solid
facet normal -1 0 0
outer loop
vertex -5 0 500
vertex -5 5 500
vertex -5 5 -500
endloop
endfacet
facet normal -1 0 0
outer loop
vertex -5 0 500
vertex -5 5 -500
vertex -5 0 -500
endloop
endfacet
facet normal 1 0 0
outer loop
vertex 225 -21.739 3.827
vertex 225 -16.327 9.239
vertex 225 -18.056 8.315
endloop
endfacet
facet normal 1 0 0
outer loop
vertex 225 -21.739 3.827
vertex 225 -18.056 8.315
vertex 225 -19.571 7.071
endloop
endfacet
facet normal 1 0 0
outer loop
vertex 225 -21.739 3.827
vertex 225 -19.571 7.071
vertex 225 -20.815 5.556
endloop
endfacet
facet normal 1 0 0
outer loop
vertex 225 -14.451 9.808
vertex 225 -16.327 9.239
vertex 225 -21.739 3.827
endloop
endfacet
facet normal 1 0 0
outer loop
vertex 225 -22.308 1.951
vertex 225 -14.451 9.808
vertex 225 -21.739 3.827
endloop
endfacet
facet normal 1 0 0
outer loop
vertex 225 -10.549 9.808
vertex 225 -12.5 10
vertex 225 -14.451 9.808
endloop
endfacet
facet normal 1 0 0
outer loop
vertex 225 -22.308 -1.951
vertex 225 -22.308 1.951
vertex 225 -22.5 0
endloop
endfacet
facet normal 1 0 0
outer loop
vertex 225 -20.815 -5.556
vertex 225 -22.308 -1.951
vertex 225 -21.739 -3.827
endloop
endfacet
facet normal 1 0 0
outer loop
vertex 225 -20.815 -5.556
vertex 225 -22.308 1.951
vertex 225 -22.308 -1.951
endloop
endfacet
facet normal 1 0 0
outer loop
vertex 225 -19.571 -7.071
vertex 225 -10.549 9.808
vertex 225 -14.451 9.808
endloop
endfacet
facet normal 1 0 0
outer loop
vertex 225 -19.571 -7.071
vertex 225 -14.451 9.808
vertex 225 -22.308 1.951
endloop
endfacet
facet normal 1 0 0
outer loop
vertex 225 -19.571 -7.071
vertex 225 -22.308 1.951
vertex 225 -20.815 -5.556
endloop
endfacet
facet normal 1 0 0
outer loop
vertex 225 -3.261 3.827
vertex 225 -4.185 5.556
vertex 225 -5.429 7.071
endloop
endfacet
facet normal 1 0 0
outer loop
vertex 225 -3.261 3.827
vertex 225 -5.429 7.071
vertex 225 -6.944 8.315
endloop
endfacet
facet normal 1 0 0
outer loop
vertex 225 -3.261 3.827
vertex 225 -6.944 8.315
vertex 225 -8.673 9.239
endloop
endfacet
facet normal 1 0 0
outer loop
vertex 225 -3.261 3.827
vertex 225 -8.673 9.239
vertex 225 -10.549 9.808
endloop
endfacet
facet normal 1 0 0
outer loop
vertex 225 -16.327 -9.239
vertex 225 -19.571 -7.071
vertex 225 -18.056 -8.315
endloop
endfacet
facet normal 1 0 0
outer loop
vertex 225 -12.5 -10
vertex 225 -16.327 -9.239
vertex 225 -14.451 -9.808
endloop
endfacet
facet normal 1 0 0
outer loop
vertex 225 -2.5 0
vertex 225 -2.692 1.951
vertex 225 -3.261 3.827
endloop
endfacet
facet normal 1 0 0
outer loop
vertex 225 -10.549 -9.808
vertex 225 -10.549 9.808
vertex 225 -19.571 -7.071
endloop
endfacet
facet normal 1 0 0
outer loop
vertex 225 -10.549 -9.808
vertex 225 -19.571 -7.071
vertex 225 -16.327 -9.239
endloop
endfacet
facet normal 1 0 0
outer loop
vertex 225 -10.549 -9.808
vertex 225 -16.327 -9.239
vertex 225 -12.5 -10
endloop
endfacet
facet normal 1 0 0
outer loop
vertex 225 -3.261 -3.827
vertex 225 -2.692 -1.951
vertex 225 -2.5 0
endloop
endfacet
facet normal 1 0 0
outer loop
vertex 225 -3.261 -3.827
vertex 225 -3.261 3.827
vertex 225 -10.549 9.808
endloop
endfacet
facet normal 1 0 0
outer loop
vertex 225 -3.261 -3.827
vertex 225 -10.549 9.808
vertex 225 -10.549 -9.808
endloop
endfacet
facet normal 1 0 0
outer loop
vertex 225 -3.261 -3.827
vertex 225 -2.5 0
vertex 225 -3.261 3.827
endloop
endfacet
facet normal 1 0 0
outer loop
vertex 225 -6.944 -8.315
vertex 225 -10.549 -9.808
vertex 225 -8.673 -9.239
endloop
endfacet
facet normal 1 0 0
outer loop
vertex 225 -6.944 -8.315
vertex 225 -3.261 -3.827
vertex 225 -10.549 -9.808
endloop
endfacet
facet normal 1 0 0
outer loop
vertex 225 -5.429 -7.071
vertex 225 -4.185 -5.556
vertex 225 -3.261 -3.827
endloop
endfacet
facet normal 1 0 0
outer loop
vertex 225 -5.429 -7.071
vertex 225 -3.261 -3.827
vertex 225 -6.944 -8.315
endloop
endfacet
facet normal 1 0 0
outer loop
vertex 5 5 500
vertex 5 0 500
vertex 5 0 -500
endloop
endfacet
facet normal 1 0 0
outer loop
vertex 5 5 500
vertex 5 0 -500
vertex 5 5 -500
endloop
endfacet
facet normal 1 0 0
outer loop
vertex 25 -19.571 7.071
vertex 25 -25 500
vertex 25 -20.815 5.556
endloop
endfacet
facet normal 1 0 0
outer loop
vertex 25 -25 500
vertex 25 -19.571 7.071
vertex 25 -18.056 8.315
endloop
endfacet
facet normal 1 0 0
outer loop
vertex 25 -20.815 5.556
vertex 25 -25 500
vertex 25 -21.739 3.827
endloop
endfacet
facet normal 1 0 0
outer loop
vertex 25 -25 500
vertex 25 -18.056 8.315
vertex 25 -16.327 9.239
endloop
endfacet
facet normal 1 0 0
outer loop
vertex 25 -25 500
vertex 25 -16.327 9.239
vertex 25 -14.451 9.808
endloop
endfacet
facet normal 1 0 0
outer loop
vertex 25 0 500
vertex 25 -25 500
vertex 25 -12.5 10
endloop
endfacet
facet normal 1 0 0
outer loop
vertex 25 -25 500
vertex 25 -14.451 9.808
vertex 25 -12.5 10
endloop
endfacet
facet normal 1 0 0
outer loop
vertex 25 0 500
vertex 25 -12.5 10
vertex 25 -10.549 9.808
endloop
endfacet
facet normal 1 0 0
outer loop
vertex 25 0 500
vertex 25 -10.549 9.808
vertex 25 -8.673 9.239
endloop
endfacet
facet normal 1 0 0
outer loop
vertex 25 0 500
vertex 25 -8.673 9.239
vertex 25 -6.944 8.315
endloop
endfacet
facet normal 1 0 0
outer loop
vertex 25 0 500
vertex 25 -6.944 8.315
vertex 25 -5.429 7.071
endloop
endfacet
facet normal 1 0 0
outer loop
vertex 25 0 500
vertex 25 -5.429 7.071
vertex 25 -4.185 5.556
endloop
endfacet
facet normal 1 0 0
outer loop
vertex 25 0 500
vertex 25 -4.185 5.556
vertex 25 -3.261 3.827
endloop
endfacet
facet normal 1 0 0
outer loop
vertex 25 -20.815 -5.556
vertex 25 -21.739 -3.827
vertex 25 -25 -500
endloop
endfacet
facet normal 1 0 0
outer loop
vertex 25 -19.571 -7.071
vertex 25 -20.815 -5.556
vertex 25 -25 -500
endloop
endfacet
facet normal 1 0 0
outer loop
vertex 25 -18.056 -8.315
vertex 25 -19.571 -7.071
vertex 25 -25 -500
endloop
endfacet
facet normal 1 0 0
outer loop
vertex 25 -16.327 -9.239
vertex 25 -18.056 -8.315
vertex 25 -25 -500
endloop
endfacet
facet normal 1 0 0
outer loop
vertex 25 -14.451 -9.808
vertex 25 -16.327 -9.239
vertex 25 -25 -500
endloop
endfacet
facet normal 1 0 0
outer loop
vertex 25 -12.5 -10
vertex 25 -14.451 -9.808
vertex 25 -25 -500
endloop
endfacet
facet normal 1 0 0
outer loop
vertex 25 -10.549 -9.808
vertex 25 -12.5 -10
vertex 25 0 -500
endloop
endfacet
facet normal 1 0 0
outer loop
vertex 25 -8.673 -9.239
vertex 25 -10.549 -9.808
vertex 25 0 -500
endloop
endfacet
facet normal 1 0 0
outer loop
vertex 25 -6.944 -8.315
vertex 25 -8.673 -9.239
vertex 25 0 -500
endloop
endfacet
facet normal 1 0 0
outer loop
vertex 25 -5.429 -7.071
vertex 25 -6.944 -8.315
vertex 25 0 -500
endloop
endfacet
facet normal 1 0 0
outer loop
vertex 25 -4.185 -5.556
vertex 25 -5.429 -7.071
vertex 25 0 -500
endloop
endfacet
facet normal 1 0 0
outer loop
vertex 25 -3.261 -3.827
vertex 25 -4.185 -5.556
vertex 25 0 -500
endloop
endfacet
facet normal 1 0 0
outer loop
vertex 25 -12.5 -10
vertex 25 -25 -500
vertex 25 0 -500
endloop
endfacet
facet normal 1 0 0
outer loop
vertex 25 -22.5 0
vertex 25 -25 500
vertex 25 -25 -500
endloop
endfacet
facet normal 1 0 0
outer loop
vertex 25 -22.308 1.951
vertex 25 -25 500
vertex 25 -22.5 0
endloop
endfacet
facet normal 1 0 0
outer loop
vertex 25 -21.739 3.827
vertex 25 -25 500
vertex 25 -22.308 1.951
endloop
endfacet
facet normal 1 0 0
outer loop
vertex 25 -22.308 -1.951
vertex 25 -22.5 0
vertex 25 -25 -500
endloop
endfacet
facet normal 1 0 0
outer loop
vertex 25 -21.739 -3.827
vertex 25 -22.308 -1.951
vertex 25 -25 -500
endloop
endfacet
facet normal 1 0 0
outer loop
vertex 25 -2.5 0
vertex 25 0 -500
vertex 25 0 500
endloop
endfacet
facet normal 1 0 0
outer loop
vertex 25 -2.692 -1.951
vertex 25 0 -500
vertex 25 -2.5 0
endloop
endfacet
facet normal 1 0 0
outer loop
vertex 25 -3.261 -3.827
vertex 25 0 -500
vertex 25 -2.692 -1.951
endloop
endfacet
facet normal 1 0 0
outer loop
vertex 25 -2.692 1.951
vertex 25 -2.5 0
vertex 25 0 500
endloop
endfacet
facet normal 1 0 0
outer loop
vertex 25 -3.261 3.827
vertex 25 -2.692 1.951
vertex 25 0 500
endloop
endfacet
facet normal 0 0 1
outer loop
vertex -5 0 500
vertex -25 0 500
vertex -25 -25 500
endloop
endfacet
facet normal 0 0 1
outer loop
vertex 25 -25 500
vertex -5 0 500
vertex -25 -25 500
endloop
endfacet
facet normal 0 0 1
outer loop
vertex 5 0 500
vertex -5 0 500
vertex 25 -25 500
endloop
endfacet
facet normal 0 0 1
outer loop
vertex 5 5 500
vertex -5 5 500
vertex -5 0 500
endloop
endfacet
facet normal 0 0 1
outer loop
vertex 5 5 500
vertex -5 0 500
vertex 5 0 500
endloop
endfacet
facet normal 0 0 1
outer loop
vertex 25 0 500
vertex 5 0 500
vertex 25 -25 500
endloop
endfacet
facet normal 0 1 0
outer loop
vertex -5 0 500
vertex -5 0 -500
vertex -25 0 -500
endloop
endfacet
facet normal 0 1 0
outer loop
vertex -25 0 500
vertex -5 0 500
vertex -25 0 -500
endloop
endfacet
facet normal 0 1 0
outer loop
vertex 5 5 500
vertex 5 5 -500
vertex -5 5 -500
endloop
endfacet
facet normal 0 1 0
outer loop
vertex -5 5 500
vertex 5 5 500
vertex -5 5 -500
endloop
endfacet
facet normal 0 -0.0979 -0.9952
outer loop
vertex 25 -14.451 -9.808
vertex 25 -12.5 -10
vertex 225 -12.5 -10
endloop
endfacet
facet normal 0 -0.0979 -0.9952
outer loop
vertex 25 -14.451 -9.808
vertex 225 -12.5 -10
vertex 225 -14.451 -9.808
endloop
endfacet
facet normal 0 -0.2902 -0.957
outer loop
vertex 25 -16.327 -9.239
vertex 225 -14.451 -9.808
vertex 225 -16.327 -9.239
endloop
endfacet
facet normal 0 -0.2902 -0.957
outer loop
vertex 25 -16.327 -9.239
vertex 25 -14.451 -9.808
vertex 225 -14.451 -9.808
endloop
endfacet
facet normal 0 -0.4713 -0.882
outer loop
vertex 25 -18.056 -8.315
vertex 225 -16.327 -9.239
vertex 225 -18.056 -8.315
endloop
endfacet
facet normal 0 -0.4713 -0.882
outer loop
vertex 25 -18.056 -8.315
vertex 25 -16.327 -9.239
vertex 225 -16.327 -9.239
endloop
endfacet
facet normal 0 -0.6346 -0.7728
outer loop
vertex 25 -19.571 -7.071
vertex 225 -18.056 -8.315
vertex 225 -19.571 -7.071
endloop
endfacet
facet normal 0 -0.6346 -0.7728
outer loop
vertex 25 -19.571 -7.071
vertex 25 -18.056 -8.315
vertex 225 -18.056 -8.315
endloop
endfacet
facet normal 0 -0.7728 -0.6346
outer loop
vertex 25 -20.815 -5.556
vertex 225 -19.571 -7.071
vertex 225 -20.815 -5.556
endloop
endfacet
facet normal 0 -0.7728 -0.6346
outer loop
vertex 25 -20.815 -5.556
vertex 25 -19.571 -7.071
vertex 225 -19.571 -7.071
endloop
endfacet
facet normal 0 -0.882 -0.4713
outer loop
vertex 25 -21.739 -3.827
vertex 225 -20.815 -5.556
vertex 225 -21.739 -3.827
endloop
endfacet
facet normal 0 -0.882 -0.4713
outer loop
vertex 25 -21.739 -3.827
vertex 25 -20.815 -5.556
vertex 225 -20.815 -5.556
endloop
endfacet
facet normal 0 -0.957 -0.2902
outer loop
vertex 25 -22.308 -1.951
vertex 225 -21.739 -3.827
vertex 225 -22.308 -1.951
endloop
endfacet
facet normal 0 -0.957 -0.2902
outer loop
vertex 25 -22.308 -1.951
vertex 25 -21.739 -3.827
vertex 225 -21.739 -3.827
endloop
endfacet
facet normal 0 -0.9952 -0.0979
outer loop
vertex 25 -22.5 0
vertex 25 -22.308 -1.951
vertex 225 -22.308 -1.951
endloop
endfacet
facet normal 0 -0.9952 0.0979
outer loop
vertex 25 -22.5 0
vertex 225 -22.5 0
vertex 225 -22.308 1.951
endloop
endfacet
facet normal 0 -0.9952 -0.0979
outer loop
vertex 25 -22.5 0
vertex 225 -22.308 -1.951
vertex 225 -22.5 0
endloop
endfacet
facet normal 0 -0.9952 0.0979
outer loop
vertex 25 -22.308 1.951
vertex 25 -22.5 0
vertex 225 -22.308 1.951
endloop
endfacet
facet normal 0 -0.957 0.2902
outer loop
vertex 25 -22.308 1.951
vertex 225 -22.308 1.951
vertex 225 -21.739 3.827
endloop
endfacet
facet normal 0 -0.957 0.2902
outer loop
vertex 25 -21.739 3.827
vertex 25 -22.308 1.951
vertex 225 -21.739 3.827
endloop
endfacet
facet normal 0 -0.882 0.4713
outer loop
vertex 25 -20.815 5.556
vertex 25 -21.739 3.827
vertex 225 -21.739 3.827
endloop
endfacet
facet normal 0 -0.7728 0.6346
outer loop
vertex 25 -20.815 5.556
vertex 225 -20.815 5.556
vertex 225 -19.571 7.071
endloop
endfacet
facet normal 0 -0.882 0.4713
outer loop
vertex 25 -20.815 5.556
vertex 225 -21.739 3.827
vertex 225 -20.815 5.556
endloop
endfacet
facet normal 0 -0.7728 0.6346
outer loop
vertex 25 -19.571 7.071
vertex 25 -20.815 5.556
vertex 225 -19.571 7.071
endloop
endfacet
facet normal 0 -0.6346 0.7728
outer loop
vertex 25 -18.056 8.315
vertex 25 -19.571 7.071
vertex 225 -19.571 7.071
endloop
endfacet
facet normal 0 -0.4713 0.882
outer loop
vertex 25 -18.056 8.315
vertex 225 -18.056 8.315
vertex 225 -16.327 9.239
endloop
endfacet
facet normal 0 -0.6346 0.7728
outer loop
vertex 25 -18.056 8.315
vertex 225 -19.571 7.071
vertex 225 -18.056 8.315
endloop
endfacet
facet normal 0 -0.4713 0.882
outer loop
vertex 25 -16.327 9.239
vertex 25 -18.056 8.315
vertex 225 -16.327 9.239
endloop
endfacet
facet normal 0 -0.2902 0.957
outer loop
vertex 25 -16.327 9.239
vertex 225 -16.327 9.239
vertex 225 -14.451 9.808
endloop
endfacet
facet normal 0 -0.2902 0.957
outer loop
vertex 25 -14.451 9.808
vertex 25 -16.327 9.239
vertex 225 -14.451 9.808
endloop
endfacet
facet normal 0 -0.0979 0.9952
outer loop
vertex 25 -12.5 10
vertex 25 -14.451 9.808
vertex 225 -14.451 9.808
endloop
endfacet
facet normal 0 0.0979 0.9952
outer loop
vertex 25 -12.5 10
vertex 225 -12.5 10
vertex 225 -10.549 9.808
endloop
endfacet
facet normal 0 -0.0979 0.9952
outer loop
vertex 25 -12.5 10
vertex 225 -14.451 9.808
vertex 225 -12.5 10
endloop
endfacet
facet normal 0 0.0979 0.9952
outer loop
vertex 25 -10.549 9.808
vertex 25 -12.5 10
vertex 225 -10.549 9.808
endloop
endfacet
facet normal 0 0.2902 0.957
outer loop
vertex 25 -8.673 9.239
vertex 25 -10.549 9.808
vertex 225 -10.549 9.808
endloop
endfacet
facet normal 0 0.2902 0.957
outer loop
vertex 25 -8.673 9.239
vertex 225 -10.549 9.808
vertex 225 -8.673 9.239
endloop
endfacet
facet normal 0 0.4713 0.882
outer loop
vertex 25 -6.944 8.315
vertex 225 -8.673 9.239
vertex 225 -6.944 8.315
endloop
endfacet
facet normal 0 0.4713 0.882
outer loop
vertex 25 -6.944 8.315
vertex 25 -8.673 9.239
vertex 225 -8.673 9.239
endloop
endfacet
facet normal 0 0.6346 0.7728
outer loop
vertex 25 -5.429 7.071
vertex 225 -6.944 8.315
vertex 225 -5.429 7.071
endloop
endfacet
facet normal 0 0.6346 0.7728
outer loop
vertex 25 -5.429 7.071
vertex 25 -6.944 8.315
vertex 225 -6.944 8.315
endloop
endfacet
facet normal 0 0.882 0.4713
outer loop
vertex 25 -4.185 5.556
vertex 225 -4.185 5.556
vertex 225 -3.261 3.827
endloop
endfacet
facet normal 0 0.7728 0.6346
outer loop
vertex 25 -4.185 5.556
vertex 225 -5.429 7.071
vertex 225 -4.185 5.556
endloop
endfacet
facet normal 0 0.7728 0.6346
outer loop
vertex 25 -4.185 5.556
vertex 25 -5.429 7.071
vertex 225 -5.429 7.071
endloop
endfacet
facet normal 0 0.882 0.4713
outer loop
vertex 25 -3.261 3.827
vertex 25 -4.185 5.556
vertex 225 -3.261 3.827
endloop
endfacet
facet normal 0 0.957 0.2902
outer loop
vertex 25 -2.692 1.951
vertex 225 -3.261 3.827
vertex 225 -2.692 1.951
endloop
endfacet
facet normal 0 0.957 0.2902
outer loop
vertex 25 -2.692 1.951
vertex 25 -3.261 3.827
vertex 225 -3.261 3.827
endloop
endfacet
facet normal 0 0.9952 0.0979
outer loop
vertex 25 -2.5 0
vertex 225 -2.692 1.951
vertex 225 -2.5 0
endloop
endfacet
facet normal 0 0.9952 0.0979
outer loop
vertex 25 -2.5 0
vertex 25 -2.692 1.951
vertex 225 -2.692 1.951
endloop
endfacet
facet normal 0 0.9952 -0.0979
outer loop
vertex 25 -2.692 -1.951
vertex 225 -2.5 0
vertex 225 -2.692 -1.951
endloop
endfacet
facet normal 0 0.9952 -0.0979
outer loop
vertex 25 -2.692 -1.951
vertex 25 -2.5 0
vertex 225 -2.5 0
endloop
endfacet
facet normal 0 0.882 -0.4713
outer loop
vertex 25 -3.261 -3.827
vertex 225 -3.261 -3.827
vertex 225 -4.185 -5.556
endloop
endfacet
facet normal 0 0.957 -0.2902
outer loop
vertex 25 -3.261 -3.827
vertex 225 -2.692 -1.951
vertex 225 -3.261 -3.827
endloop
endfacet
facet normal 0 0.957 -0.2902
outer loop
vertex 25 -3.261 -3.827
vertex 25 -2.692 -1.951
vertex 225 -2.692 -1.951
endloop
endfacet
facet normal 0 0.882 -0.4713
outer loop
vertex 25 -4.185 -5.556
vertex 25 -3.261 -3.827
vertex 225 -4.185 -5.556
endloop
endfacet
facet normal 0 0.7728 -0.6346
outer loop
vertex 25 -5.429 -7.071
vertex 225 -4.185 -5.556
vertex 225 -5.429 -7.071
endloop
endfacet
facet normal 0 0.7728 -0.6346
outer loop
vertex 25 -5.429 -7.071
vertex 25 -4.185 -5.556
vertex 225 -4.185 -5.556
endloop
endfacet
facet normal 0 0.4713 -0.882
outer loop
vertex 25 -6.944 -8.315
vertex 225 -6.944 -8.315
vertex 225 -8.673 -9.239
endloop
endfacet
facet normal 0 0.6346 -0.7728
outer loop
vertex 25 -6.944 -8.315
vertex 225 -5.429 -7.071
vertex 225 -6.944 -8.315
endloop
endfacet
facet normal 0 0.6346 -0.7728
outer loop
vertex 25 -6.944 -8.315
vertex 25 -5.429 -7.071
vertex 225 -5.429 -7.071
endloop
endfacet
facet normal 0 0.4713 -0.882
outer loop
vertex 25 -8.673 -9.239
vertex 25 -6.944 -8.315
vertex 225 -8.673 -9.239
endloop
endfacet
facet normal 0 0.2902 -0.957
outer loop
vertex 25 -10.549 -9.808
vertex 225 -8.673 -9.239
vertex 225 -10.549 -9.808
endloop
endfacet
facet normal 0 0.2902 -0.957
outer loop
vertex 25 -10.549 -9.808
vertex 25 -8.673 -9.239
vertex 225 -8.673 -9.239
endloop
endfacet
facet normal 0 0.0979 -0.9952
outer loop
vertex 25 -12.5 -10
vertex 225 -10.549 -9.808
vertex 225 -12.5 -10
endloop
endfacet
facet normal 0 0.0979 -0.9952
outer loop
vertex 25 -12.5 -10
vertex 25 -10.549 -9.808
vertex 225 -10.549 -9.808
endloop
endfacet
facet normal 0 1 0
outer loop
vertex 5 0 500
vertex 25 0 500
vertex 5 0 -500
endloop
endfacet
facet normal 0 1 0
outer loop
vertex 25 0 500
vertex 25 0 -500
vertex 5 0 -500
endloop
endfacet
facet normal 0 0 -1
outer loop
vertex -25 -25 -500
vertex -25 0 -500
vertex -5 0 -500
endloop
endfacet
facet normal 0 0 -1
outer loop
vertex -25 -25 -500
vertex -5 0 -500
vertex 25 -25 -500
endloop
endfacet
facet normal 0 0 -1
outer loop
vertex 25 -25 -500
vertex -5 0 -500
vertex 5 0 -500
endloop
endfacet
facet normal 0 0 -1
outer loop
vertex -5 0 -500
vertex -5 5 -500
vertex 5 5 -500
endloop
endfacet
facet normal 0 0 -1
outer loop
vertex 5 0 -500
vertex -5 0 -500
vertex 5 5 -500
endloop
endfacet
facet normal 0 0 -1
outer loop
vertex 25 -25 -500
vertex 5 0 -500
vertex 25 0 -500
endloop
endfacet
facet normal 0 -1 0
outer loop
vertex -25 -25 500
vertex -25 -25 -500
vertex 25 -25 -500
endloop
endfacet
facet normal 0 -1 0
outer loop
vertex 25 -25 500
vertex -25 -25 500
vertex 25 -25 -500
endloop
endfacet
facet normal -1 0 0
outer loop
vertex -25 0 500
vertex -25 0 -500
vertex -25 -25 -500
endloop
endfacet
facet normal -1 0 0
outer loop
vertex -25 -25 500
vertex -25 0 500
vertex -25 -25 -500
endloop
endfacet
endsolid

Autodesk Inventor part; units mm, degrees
ref_plane "YZ Plane" through (0, 0, 0) normal (1, 0, 0) x (0, 1, 0)
ref_plane "XZ Plane" through (0, 0, 0) normal (0, 1, 0) x (-1, 0, 0)
ref_plane "XY Plane" through (0, 0, 0) normal (0, 0, 1) x (1, 0, 0)
sketch "Sketch1" plane through (0, 0, 0) normal (0, 0, 1) x (1, 0, 0)
  line L0 (0, 5) -> (-5, 5)
  line L1 (-5, 5) -> (-5, 0)
  line L2 (-5, 0) -> (-25, 0)
  line L3 (-25, 0) -> (-25, -25)
  line L4 (-25, -25) -> (25, -25)
  line L5 (25, -25) -> (25, 0)
  line L6 (25, 0) -> (5, 0)
  line L7 (5, 0) -> (5, 5)
  line L8 (5, 5) -> (0, 5)
  point P0 (0, 0)
  dimension "d0" = 5
  dimension "d1" = 5
  dimension "d2" = 5
  dimension "d3" = 5
  dimension "d4" = 50
  dimension "d5" = 25
  dimension "d6" = 25
  dimension "d7" = 20
  dimension "d8" = 5
extrude "Extrusion1" add sketch "Sketch1" along normal mid plane 1000
sketch "Sketch2" plane through (25, -25, 500) normal (1, 0, 0) x (0, 0, -1)
  circle A0 centre (500, 12.5) radius 10
  line L0 (1000, 0) -> (0, 0) projected
  line L1 (0, 0) -> (0, 25) projected
  point P0 (500, 25)
  dimension "d11" = 20
  dimension "d12" = 12.5
  dimension "d13" = 500
extrude "Extrusion2" add sketch "Sketch2" along normal blind 200
properties part number "peam"
